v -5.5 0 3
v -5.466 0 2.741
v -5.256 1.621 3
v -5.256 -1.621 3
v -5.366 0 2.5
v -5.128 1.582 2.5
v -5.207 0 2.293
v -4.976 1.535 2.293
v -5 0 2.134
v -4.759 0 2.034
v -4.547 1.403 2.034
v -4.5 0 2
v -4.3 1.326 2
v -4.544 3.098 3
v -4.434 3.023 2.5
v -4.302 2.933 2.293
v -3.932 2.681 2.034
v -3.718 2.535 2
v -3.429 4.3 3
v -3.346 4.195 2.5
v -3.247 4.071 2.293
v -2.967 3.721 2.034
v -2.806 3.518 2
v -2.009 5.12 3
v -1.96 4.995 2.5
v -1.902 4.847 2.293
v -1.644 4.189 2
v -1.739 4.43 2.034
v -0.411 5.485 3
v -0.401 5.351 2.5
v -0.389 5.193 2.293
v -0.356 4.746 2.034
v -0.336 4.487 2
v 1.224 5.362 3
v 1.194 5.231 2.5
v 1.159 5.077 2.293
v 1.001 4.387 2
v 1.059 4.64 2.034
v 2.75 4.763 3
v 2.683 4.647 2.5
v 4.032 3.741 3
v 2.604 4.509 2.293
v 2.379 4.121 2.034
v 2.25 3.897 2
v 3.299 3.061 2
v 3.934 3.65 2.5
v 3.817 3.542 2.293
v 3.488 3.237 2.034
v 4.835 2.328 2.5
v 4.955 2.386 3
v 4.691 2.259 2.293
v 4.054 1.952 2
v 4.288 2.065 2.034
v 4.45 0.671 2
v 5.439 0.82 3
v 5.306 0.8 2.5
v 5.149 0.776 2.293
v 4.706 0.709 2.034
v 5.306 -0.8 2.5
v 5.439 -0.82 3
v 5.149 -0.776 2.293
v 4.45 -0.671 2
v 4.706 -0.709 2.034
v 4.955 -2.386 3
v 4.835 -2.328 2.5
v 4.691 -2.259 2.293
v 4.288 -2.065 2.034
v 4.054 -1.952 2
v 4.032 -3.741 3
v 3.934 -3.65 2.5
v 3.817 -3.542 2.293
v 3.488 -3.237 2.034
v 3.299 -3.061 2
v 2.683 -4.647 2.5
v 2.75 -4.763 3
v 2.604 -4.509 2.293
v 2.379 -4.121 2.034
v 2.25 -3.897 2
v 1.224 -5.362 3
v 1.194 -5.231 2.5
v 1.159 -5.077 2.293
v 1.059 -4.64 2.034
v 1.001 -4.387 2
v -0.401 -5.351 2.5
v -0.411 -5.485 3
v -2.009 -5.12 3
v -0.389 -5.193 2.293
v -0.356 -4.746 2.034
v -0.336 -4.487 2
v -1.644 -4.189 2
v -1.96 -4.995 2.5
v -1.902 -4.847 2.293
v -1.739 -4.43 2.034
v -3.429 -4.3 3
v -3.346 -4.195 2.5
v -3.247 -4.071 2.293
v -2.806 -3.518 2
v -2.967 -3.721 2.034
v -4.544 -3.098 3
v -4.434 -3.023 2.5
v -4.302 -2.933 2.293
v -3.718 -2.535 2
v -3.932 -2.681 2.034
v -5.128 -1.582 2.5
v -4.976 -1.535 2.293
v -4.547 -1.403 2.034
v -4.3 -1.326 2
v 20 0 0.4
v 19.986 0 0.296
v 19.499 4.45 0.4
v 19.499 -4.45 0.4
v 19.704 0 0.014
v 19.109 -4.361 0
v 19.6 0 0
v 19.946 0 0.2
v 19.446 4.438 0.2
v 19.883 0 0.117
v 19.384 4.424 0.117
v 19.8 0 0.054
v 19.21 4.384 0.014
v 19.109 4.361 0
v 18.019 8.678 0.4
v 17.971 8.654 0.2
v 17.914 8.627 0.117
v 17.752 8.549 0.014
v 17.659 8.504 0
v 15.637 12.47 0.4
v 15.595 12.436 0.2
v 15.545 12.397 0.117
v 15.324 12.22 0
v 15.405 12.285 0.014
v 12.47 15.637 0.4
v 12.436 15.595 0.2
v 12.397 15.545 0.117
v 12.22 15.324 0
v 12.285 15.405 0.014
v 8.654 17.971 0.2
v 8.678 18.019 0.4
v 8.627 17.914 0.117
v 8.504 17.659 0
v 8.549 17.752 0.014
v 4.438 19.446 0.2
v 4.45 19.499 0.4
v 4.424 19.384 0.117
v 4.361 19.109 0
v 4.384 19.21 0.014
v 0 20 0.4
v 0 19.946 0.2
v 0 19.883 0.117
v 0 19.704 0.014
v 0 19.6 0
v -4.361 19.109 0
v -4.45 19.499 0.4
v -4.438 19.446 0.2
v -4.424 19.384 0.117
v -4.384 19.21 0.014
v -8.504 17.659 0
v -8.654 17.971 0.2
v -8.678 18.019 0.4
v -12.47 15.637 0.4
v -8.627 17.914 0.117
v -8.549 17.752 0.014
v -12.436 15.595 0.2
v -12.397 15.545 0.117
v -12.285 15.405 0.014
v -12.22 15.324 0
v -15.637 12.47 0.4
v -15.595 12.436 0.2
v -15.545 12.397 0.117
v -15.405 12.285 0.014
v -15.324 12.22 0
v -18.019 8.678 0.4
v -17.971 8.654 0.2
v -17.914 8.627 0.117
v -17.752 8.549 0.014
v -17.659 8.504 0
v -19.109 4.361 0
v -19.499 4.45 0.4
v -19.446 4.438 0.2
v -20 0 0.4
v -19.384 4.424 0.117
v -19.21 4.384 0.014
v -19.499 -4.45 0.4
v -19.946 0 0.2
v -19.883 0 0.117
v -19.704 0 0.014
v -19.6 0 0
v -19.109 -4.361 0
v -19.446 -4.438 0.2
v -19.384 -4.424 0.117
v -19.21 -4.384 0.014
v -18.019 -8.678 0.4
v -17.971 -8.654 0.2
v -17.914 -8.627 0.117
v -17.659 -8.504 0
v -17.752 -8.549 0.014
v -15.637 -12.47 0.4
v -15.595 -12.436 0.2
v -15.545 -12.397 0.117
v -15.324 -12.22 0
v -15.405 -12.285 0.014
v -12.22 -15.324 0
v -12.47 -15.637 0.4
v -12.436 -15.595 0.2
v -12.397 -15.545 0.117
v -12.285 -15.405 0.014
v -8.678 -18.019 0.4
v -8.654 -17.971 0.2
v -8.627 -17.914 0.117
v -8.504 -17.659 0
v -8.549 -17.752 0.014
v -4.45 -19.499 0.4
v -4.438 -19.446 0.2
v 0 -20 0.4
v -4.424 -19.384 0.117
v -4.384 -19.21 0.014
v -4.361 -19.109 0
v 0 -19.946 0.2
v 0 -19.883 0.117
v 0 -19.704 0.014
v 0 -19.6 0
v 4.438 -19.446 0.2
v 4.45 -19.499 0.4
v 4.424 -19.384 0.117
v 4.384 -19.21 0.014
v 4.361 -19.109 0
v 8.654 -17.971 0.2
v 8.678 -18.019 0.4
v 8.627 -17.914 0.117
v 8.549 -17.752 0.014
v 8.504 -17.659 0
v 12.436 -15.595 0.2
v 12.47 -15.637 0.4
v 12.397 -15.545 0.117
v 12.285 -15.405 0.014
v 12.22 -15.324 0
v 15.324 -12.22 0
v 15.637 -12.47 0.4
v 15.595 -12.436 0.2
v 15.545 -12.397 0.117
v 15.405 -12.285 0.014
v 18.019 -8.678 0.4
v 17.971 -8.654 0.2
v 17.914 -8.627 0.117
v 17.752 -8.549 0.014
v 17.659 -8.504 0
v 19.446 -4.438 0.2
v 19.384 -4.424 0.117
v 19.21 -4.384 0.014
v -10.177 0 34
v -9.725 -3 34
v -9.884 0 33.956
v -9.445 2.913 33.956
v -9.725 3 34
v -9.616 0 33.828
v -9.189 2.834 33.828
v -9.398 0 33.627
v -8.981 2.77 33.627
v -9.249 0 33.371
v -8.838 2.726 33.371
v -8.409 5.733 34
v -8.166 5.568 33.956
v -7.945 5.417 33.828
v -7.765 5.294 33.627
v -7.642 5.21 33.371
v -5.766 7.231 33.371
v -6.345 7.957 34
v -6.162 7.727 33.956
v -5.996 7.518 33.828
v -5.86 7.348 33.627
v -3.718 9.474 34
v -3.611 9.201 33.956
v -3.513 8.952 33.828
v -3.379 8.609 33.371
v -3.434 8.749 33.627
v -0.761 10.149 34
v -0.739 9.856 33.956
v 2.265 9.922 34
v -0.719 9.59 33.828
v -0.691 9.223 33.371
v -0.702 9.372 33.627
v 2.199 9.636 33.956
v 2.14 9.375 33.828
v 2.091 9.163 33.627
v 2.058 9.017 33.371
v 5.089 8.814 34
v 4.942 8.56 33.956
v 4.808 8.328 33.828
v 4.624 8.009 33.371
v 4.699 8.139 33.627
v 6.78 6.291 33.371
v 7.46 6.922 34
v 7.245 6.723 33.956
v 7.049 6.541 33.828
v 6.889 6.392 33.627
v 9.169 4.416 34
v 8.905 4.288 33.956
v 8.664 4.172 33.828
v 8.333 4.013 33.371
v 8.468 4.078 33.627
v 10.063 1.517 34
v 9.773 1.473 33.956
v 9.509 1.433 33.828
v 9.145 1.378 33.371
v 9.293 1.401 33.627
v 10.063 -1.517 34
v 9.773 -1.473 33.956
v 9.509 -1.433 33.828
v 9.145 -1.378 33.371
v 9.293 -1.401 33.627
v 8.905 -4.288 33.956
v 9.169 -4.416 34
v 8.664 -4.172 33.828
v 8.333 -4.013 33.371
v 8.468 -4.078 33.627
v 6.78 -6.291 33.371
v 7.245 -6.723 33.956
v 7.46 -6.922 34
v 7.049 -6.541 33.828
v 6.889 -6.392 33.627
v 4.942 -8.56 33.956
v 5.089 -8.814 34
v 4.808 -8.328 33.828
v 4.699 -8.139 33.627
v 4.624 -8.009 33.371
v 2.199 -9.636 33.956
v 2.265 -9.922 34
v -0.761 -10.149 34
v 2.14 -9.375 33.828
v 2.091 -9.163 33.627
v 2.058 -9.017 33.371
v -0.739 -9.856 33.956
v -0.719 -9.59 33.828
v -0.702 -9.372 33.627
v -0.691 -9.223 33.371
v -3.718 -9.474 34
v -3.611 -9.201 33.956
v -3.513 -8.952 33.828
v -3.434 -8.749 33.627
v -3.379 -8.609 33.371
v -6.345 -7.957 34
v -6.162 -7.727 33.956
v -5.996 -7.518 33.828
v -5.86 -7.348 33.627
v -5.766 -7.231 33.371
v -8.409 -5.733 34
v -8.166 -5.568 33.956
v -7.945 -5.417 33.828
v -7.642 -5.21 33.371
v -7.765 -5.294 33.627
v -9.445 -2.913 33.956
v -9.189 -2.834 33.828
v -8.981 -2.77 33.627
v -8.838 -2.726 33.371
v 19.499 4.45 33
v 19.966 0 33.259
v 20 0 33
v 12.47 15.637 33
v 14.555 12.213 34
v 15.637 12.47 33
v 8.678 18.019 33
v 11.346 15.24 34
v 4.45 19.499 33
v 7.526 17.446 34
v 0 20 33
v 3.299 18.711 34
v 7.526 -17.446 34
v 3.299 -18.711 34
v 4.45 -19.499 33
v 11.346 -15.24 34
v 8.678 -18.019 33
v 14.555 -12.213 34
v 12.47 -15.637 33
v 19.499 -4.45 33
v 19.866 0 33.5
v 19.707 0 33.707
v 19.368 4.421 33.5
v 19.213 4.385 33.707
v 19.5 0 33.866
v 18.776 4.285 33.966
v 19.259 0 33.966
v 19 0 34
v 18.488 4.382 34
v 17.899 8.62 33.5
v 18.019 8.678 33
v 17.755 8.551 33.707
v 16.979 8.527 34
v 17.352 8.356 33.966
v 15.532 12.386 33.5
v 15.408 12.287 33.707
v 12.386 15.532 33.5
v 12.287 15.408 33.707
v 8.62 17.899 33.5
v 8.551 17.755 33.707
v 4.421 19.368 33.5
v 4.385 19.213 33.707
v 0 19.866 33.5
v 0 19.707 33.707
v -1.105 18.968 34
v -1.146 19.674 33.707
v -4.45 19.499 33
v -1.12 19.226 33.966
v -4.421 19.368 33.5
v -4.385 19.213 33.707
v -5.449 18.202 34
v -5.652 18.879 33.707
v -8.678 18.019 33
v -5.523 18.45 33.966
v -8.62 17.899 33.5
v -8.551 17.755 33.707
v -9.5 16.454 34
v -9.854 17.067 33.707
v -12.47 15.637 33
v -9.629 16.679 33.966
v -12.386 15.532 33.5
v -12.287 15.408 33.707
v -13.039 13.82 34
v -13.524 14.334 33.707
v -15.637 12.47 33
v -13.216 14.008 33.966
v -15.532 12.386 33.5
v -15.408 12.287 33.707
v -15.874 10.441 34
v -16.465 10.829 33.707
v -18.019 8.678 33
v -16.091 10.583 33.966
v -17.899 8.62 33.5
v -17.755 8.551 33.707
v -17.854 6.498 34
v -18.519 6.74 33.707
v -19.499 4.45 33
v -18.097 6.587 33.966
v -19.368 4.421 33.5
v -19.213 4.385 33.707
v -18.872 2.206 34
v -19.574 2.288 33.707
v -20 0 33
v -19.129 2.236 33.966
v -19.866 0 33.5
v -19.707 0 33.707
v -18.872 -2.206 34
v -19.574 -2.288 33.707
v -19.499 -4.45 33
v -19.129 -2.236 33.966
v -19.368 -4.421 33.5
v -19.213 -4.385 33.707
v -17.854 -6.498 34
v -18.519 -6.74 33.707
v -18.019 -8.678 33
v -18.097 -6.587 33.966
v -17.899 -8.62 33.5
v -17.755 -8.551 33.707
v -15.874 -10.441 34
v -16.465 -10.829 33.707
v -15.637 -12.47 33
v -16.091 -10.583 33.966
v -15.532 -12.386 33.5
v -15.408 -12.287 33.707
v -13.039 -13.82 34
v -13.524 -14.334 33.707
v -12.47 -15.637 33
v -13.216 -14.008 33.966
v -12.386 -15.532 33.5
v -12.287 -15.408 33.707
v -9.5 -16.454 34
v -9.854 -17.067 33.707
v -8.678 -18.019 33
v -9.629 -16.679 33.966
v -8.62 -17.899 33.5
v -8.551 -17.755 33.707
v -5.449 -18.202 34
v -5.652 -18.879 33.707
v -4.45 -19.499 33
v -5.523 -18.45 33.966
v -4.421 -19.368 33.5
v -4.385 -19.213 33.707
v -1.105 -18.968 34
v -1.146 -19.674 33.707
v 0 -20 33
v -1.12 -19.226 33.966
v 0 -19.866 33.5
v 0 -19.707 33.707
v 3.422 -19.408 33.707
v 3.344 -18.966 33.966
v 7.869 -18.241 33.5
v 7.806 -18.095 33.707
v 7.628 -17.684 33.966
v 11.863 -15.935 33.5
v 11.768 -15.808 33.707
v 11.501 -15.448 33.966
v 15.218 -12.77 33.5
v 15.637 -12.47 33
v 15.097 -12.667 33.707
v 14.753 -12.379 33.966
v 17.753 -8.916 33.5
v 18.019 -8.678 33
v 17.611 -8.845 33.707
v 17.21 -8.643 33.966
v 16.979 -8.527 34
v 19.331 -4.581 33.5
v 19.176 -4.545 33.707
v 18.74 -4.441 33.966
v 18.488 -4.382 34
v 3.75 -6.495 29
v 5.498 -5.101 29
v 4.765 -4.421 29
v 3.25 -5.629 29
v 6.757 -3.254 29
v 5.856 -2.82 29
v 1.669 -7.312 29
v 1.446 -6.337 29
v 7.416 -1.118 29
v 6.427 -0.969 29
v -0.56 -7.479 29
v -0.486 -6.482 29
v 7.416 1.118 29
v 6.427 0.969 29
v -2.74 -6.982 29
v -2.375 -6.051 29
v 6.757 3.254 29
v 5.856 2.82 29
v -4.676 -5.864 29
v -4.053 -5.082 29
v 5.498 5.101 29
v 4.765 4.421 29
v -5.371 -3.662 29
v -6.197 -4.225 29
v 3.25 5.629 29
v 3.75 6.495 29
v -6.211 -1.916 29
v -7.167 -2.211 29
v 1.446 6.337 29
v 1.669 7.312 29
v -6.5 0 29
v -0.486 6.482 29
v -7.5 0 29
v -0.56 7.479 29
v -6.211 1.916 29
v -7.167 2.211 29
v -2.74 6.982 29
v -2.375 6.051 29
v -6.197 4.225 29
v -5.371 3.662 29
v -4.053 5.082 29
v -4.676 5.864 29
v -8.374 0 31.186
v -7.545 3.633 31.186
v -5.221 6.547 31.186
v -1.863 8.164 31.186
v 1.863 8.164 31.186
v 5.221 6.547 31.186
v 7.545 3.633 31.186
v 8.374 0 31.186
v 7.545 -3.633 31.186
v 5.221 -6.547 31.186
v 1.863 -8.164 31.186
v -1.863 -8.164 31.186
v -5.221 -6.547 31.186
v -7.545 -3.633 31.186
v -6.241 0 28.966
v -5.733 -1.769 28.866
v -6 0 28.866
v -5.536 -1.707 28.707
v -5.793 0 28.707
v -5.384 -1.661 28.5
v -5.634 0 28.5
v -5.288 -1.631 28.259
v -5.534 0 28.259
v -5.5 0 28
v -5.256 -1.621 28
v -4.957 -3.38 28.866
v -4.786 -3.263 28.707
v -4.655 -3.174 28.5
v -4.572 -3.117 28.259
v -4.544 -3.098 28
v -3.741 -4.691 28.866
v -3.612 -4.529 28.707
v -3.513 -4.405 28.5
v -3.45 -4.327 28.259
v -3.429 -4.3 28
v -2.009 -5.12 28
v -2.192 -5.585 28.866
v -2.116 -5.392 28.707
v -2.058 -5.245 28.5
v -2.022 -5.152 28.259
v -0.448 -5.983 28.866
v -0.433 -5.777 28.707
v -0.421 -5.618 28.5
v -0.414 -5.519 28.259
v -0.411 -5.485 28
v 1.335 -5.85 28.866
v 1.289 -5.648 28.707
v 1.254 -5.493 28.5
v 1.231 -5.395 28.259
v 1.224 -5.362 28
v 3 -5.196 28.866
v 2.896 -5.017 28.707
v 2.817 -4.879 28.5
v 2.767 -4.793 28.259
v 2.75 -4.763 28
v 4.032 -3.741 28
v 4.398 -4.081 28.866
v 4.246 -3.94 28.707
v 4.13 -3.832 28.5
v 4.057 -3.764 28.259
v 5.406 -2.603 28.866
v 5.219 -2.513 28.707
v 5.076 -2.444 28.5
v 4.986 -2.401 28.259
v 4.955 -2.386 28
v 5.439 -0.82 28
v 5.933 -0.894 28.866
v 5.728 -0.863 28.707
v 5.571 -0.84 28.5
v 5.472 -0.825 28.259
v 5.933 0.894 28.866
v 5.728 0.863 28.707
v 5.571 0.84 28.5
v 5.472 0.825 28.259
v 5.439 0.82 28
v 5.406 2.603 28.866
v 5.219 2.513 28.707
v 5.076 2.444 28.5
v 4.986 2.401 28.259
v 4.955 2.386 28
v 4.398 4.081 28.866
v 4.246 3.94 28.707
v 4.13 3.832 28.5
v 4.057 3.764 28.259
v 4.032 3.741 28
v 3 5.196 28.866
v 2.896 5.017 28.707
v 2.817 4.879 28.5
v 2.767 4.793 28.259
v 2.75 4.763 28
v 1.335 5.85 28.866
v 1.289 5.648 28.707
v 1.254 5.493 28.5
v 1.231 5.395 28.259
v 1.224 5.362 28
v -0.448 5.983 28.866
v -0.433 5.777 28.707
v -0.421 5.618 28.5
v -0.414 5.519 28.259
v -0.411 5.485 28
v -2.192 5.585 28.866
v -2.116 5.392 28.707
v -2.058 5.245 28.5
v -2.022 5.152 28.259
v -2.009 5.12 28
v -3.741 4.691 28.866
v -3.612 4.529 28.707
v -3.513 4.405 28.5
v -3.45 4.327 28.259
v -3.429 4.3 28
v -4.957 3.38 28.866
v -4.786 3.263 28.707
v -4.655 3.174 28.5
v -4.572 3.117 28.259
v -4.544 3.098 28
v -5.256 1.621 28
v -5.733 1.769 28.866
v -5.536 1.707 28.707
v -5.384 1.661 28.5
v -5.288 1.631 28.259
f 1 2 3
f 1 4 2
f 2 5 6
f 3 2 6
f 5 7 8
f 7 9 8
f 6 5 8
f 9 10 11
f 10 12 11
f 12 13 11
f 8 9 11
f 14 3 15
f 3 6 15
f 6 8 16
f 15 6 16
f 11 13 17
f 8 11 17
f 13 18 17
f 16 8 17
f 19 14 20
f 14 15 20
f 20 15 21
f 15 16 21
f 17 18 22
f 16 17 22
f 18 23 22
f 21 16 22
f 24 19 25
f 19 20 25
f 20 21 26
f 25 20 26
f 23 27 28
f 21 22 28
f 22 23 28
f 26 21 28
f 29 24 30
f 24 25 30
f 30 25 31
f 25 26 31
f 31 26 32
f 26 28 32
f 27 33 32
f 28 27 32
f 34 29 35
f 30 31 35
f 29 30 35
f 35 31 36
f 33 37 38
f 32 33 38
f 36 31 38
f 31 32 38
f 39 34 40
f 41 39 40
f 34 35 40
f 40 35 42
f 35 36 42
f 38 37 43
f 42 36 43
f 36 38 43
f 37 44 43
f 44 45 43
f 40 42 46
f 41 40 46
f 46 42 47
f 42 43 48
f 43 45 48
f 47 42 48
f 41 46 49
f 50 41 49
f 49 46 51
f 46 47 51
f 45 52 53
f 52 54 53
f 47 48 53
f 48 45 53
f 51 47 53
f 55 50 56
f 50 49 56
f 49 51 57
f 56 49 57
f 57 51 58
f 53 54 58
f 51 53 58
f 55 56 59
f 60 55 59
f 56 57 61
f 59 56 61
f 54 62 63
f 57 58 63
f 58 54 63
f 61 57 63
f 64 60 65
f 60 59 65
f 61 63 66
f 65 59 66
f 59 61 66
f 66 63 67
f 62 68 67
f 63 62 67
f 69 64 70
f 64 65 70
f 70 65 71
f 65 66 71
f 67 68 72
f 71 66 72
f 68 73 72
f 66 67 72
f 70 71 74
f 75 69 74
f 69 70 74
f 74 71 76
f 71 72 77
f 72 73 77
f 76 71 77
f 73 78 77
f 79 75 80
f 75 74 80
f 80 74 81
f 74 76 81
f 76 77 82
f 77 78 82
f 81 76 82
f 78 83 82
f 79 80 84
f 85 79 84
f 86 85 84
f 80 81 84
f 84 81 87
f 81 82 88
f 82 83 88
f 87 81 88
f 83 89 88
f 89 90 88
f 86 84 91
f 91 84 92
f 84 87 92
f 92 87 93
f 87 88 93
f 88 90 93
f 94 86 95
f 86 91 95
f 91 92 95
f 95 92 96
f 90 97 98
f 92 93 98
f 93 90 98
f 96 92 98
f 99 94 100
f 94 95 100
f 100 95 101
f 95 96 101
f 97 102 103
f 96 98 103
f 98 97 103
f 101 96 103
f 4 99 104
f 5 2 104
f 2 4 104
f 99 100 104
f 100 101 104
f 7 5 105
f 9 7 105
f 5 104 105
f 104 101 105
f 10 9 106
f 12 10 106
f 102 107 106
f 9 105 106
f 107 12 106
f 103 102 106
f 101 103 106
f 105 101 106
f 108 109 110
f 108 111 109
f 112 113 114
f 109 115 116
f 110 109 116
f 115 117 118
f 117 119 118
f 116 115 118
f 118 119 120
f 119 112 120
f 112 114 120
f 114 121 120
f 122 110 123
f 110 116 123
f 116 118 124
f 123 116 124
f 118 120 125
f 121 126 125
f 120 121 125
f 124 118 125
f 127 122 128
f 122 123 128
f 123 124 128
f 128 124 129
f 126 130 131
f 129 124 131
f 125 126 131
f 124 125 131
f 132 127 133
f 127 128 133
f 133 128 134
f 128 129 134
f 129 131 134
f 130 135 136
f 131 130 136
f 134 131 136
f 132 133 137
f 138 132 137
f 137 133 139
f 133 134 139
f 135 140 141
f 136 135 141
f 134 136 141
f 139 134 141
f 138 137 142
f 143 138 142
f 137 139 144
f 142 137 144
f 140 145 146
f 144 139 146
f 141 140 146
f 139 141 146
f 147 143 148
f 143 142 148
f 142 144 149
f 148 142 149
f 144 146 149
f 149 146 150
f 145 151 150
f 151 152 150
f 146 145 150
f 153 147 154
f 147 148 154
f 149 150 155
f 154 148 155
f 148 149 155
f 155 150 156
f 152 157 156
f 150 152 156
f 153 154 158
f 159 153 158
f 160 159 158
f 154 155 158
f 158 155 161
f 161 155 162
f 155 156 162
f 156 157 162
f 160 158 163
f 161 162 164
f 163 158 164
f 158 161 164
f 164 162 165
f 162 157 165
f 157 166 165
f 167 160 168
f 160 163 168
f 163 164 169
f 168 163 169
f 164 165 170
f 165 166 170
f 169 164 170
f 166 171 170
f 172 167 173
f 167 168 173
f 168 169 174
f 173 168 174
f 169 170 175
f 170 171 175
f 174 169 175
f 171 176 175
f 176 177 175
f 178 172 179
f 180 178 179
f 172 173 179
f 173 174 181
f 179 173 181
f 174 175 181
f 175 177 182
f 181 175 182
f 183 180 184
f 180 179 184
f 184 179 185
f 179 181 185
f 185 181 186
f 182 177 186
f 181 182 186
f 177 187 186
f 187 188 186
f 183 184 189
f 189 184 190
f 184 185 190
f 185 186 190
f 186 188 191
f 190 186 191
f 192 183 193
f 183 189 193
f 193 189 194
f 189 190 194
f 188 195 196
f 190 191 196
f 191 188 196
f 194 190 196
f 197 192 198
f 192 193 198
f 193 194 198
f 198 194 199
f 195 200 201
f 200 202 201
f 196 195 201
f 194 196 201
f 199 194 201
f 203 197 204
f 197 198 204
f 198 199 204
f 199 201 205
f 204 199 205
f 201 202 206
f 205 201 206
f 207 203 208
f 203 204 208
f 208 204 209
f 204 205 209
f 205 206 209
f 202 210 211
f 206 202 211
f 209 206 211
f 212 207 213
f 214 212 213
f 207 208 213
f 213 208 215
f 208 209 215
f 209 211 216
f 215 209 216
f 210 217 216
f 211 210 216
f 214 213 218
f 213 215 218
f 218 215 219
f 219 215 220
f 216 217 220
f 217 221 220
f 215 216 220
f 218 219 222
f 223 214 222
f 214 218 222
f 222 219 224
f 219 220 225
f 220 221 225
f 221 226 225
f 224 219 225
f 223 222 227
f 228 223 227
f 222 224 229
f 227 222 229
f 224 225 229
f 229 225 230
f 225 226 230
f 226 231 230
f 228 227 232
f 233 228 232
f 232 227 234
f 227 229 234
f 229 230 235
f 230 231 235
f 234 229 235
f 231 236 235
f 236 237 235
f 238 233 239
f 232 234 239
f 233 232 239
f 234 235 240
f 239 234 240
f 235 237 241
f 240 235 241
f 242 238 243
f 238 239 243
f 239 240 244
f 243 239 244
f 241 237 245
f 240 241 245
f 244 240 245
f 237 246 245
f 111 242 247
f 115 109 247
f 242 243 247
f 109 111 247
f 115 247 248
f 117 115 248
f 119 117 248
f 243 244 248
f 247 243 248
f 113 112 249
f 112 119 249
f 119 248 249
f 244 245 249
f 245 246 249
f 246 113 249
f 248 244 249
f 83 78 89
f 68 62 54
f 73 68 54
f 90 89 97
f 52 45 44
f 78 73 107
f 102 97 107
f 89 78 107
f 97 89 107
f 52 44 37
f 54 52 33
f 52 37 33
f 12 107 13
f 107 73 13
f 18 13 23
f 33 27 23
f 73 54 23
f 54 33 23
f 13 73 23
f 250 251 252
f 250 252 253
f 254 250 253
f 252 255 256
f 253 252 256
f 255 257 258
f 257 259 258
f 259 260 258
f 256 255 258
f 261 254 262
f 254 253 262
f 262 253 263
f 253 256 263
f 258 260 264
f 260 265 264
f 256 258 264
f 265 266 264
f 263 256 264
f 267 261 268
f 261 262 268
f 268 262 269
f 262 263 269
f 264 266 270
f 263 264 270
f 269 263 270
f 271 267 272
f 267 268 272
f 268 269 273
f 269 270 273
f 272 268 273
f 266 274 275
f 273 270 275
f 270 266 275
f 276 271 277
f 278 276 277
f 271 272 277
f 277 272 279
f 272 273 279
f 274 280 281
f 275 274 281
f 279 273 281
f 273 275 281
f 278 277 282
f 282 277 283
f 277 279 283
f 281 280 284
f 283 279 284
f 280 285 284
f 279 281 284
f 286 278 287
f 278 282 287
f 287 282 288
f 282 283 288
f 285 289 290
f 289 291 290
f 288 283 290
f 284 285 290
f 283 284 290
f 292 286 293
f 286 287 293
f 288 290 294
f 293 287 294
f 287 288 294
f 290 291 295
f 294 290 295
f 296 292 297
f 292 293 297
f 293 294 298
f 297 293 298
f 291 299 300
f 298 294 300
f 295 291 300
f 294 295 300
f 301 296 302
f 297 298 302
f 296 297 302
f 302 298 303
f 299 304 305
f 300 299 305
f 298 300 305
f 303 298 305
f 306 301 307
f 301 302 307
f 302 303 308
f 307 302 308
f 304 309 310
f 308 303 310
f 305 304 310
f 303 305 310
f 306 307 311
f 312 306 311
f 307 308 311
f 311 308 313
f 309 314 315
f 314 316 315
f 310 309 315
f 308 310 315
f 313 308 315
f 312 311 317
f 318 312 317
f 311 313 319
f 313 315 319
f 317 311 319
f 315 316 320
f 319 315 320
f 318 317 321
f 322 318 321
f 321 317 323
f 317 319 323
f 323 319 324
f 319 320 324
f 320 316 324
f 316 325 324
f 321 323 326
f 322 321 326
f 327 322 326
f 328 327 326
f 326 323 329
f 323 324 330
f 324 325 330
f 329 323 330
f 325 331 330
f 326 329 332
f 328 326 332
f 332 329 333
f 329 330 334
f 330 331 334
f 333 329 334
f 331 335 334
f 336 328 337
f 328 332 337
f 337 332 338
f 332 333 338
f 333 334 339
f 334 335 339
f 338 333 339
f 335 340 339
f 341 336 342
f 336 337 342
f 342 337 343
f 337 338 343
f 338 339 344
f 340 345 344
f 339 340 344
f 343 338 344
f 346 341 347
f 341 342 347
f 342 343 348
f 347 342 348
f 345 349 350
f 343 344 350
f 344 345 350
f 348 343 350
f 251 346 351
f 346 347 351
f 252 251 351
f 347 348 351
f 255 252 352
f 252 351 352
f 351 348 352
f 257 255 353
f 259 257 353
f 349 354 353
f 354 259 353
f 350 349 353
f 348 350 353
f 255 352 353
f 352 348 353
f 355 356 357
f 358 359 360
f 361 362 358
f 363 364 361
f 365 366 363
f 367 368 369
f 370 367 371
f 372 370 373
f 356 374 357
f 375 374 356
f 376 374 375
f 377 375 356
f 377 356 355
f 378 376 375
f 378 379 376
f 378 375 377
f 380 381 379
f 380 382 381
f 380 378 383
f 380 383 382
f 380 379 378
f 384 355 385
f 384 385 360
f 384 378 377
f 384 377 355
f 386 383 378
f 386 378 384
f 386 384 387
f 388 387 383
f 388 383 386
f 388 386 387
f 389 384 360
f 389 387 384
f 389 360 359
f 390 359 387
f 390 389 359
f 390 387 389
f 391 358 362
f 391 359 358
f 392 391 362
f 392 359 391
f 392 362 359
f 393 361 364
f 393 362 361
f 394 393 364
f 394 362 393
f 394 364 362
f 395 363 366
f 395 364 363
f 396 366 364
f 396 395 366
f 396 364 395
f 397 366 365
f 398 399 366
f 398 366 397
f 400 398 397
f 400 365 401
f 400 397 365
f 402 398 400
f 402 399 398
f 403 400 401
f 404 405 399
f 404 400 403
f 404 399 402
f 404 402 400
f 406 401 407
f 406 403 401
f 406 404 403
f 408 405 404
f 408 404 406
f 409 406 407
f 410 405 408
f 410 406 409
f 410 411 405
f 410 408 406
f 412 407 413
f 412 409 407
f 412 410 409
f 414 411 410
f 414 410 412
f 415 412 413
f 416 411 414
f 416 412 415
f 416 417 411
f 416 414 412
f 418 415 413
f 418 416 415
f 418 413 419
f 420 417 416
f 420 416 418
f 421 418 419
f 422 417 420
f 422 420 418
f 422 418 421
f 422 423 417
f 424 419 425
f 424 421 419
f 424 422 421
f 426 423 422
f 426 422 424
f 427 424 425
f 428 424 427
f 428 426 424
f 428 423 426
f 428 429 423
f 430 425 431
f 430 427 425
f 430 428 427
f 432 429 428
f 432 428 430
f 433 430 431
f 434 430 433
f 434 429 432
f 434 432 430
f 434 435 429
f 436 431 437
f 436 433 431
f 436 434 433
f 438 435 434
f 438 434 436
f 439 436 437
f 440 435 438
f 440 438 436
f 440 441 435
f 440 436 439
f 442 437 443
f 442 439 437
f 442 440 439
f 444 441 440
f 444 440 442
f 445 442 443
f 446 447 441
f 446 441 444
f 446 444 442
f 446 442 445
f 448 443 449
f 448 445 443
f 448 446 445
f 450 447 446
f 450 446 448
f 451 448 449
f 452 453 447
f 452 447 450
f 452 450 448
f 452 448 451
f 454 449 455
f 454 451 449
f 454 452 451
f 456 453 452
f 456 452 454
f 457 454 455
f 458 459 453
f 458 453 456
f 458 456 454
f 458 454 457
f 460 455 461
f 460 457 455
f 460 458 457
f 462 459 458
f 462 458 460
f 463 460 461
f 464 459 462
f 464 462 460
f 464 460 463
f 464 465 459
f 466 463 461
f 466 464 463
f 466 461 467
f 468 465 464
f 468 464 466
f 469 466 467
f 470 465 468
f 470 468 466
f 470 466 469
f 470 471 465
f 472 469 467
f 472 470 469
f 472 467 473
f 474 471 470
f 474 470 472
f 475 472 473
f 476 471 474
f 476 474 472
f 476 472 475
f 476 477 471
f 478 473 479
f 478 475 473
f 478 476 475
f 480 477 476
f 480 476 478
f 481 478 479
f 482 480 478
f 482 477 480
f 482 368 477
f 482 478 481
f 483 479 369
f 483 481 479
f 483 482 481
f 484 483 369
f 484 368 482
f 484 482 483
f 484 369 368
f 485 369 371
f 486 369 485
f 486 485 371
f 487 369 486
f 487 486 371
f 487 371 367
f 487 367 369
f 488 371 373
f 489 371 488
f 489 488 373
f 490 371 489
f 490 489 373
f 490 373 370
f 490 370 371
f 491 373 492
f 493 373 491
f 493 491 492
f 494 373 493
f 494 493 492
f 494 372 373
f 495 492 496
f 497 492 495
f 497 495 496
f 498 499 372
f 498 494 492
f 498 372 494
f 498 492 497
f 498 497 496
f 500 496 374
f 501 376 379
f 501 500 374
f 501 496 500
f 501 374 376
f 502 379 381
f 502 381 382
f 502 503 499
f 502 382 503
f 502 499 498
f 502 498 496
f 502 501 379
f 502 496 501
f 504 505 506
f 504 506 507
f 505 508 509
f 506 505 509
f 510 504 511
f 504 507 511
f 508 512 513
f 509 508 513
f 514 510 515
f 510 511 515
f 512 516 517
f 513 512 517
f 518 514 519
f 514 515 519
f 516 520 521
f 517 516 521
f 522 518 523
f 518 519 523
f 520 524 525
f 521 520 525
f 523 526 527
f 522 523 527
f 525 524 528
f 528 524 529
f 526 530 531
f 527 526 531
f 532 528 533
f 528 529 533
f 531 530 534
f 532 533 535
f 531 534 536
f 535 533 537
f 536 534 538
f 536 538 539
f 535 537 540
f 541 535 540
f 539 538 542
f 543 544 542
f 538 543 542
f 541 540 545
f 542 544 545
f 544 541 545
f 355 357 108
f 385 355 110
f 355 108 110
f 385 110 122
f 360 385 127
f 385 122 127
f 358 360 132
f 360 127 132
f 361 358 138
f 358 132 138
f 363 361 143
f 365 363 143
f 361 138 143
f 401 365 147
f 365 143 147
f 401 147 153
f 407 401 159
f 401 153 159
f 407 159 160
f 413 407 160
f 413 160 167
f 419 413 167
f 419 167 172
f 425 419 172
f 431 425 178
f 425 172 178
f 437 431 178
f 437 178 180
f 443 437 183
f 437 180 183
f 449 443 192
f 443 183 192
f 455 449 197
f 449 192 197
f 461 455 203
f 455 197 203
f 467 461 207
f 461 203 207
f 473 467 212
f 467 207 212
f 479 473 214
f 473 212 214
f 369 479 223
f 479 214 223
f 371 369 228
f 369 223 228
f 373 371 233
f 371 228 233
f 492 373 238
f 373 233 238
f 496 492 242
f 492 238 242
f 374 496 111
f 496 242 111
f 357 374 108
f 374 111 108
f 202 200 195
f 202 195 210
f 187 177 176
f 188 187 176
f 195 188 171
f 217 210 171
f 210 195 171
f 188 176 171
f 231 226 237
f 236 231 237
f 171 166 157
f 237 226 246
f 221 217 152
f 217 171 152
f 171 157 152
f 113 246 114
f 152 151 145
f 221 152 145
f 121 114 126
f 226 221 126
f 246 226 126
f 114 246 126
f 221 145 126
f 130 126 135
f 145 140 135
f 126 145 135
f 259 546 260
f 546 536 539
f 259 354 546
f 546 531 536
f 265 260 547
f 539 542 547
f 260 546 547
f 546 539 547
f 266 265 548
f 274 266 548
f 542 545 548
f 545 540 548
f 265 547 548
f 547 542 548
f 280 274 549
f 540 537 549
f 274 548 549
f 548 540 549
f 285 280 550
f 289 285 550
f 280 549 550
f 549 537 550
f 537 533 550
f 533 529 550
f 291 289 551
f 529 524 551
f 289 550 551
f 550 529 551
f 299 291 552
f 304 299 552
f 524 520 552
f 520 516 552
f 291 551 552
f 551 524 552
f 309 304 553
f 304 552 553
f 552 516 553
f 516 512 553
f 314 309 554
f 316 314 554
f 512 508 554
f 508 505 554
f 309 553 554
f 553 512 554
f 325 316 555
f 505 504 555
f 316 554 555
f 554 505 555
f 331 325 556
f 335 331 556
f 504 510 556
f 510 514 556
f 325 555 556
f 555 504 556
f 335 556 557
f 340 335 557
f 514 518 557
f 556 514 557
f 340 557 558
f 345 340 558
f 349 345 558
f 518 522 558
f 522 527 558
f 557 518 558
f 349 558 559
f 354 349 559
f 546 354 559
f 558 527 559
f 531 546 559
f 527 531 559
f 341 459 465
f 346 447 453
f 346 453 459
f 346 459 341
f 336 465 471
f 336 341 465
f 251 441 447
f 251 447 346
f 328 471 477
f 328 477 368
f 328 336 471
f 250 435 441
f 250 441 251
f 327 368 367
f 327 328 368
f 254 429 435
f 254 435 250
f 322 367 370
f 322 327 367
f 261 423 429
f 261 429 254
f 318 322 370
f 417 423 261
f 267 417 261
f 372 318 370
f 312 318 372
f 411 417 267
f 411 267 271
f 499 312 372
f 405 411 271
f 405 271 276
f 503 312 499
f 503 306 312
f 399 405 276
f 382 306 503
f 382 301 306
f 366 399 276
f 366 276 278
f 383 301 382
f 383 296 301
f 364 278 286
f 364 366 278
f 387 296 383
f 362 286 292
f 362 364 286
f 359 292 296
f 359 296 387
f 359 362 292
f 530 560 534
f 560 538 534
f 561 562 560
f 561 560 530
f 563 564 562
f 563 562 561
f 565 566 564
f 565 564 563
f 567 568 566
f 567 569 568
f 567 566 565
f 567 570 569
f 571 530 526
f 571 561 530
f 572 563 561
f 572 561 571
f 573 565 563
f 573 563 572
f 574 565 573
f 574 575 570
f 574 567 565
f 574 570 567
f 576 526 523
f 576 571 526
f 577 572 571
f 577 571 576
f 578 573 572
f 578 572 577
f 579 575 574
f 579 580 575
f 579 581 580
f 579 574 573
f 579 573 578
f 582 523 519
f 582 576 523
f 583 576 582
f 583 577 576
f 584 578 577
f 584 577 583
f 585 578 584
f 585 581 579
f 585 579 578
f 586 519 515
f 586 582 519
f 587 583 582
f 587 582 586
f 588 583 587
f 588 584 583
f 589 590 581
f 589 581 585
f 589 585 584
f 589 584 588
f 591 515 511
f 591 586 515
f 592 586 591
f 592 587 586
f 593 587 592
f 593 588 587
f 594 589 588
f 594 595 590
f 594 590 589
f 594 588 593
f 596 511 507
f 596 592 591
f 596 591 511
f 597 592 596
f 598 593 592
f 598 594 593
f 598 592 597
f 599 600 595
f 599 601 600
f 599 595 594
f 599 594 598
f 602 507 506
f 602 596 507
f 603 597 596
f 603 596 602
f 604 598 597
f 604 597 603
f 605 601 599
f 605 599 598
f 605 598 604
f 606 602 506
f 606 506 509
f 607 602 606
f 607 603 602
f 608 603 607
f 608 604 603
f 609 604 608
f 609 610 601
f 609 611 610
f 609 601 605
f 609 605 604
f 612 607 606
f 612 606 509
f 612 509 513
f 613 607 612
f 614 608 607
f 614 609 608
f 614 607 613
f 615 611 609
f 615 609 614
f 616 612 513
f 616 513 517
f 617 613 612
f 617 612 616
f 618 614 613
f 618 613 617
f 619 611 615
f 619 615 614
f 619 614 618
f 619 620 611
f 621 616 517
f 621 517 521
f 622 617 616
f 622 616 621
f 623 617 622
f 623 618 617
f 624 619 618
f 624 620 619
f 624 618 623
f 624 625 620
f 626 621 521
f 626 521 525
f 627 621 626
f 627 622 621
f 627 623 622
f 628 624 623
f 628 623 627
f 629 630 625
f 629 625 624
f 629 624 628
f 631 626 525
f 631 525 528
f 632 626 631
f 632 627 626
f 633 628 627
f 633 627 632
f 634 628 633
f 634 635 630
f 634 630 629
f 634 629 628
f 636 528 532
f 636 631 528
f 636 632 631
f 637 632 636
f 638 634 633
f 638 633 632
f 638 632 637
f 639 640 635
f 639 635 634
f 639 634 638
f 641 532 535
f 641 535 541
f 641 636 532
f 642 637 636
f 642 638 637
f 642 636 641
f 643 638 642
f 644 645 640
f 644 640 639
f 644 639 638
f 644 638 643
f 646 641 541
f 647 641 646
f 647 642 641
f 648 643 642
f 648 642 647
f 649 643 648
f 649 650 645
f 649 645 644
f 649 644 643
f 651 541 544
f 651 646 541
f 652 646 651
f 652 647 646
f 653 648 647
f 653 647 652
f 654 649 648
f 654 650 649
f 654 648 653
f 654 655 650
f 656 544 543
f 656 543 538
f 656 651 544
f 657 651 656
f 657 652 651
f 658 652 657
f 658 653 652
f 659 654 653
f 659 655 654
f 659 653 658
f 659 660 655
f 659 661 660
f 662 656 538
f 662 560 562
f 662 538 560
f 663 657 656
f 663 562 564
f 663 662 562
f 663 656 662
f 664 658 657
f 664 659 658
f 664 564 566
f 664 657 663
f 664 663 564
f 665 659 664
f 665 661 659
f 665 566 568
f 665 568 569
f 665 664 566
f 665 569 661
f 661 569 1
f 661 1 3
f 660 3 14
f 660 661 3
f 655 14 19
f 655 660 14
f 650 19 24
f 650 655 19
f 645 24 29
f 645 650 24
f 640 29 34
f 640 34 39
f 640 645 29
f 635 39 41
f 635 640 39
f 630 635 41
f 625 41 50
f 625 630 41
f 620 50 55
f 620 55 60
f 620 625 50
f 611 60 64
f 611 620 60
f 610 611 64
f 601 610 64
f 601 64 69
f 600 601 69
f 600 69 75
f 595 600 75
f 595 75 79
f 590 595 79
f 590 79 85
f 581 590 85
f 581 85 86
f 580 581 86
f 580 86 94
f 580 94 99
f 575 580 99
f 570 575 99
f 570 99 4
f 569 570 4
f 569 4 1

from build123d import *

# Parameters (mm, degrees)
CYLINDER_R        = 20
CYLINDER_DEPTH    = 34
CYLINDER001_R     = 5.5
CYLINDER001_DEPTH = 32
FILLET_R          = 1
FILLET001_R       = 0.4


with BuildPart() as part:
    # Cylinder → Cylinder (join)
    with BuildSketch(Plane.XY):
        Circle(CYLINDER_R)
    extrude(amount=CYLINDER_DEPTH)

    # Cylinder001 → Cylinder001 (cut)
    with BuildSketch(Plane(origin=(0, 0, 34), x_dir=(-1, 0, 0), z_dir=(0, 0, -1))):
        Circle(CYLINDER001_R)
    extrude(amount=CYLINDER001_DEPTH, mode=Mode.SUBTRACT)

    # Cone → Cone (revolve, cut)
    with BuildSketch(Plane(origin=(0, 0, 34), x_dir=(-1, 0, 0), z_dir=(0, -1, 0))):
        Polygon((0, 0), (9.5, 0), (7.5, 5), (0, 5), align=None)
    revolve(axis=Axis((0, 0, 34), (0, 0, -1)), mode=Mode.SUBTRACT)

    # Fillet
    fillet_edges = [part.edges().sort_by_distance(p)[0] for p in [
        (-20, 0, 34),
        (9.5, 0, 34),
        (5.5, 0, 29),
        (5.5, 0, 2),
    ]]
    fillet(fillet_edges, radius=FILLET_R)

    # Fillet001
    fillet001_edges = [part.edges().sort_by_distance(p)[0] for p in [
        (-20, 0, 0),
    ]]
    fillet(fillet001_edges, radius=FILLET001_R)


solid = part.part
